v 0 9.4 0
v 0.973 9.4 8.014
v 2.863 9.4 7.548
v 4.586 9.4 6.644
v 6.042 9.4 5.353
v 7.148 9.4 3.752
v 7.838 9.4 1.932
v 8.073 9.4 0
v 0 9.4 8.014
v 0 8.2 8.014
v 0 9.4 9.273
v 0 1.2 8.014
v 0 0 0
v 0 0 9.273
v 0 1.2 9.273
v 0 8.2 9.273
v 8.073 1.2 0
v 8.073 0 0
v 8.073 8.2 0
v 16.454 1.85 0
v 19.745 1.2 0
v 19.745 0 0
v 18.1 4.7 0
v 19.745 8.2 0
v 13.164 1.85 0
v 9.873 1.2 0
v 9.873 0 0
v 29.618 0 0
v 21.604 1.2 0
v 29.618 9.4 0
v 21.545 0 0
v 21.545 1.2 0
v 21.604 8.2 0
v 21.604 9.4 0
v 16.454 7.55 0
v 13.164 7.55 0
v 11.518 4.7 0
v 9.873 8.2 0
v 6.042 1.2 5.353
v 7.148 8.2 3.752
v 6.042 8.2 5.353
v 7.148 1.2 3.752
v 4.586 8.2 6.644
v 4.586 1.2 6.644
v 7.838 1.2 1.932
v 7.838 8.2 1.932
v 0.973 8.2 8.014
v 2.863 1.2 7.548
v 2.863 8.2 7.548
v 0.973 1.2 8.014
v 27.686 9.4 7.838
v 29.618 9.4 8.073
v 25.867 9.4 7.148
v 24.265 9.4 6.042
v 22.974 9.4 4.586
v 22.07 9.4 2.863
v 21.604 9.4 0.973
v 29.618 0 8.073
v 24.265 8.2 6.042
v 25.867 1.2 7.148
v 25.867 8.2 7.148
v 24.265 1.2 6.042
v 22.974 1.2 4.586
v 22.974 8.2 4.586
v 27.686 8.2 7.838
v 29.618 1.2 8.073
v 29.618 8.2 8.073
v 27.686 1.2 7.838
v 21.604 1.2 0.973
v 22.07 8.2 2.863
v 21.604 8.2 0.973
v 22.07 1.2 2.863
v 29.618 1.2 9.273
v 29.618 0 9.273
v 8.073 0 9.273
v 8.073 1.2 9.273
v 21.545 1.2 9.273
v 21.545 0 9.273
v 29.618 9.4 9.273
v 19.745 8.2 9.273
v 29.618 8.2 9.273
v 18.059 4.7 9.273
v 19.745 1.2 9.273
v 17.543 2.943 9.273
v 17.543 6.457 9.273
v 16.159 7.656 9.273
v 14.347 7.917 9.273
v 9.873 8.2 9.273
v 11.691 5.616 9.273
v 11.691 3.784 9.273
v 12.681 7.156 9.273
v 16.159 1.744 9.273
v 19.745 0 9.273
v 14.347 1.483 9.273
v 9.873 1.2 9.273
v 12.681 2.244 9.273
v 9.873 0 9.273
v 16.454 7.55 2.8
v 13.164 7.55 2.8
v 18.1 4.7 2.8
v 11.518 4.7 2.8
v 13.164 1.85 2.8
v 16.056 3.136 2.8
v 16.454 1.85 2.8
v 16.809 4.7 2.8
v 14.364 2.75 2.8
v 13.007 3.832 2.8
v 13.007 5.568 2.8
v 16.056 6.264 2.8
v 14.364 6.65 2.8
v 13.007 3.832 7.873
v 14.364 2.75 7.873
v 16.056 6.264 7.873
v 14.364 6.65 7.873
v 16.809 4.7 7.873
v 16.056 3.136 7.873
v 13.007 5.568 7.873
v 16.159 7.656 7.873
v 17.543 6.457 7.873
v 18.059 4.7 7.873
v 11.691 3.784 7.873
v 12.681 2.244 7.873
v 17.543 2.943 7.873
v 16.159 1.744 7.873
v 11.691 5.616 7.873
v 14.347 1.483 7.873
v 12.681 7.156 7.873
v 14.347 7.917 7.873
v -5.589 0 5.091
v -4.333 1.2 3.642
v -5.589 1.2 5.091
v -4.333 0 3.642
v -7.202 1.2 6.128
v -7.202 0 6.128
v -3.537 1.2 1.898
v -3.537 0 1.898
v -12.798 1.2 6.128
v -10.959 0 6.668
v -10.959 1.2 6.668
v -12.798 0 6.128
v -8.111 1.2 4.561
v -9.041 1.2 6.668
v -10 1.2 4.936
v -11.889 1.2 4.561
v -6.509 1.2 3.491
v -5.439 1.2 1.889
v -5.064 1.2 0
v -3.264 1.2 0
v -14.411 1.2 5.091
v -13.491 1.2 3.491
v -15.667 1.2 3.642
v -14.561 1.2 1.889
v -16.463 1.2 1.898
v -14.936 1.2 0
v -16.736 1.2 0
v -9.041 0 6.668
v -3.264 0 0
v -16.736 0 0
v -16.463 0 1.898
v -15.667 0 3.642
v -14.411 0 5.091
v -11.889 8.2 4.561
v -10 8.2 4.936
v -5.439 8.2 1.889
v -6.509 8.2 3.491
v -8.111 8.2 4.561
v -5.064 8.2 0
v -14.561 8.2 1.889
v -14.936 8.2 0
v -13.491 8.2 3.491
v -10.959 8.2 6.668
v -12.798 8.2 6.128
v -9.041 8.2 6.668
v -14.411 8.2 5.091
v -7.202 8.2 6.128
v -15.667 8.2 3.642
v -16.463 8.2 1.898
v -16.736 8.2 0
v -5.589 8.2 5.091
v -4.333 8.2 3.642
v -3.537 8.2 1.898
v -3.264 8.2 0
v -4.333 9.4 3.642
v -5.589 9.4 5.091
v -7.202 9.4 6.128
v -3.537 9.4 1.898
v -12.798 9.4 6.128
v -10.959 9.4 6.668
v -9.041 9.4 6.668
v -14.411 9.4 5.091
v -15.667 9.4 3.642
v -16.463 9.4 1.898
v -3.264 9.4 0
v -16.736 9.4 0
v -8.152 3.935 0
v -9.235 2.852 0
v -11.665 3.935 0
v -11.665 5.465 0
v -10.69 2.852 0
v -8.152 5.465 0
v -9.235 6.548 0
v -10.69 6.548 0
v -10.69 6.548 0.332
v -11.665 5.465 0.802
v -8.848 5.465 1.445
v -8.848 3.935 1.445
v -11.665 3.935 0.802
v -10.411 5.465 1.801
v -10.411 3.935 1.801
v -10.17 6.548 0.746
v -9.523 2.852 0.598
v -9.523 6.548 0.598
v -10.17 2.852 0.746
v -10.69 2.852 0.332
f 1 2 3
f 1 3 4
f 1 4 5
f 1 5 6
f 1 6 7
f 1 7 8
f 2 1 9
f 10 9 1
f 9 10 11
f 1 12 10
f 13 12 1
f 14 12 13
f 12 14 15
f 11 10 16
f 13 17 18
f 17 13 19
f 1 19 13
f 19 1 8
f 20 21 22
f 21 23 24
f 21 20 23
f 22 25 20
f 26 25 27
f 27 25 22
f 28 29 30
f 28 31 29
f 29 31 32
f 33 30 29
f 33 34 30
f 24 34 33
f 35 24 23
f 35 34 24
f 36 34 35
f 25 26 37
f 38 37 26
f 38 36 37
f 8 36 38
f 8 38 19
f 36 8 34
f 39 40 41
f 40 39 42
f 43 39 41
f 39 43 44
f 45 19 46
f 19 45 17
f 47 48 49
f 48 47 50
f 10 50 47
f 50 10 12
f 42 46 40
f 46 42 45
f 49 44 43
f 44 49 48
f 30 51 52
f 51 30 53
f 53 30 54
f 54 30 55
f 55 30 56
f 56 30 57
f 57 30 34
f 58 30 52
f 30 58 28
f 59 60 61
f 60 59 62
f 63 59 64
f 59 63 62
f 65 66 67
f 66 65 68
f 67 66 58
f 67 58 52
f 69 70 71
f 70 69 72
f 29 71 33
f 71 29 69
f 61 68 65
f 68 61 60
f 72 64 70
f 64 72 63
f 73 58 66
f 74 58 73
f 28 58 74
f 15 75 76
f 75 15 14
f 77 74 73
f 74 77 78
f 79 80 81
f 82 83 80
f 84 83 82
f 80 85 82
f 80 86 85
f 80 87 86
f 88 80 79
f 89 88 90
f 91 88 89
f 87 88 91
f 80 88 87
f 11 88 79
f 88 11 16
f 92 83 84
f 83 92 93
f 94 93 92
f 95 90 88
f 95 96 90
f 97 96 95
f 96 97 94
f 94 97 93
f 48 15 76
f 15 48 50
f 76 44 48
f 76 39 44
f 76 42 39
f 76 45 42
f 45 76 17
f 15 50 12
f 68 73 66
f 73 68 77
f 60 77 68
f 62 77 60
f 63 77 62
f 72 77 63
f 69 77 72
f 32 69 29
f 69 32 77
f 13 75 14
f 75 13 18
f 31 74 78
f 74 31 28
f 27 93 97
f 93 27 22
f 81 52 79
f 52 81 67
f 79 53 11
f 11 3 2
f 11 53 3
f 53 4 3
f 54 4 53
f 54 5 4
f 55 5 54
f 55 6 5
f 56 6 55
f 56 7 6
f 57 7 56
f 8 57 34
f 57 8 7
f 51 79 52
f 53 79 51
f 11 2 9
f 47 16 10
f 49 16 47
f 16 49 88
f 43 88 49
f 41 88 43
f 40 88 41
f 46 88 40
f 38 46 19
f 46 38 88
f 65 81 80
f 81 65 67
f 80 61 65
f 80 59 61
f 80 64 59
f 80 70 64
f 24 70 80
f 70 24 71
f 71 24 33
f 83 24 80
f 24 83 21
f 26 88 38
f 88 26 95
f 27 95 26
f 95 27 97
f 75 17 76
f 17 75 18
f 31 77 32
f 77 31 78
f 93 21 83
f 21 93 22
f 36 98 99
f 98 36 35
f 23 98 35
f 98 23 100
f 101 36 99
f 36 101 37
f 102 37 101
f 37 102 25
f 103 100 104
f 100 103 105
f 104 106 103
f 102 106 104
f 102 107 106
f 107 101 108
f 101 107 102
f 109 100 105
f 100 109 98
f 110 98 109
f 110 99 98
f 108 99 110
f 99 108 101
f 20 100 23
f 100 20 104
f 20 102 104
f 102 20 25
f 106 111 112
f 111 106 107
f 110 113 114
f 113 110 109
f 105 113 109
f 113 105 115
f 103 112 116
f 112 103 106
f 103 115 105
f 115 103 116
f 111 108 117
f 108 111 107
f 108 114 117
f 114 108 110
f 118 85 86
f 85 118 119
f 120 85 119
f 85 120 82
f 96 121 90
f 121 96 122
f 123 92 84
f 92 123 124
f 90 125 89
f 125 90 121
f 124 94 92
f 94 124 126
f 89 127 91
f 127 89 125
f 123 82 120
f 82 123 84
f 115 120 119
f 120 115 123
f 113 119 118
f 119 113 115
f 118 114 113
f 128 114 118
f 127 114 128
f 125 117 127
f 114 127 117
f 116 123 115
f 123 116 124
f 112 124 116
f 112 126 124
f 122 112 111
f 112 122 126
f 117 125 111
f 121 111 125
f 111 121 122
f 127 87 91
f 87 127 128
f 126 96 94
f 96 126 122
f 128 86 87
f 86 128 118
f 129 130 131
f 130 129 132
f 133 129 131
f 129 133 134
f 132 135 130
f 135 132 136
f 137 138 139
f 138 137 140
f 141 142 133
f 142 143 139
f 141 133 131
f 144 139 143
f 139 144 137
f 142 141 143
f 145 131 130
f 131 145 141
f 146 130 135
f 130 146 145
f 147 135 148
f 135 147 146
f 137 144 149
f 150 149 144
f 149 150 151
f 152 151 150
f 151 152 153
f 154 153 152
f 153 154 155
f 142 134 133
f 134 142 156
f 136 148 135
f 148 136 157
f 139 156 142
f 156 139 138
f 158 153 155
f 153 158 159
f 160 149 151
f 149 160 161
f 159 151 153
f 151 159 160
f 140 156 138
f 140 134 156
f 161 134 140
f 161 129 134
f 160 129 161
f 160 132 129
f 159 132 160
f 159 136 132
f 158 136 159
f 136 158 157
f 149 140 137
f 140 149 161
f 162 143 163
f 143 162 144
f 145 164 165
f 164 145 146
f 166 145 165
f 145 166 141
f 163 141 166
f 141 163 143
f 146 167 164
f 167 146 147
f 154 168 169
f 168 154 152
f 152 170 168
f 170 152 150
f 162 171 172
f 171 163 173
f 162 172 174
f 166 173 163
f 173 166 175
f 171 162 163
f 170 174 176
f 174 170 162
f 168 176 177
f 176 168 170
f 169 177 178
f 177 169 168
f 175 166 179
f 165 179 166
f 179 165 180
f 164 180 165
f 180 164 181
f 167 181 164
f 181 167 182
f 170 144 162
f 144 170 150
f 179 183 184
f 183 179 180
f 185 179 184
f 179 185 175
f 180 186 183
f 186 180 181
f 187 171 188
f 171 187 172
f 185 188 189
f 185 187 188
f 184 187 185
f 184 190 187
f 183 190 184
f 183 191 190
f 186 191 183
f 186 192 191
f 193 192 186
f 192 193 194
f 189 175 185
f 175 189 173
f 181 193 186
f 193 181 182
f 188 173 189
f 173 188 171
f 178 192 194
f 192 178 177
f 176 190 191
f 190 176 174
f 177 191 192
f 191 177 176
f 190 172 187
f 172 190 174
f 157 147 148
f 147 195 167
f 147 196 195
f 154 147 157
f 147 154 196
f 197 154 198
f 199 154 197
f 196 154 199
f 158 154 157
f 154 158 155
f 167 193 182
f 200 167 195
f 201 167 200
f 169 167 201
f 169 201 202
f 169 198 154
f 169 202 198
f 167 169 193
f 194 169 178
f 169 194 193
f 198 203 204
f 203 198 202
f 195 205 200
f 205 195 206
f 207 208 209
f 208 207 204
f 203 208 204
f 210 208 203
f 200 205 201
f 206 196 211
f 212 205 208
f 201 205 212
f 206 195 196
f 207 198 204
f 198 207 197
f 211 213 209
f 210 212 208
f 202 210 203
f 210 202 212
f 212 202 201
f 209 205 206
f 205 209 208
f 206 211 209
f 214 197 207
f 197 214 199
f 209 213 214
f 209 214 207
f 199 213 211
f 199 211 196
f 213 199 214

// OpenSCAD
//Wrench size of the nut
NutWrenchSize=5.7;

//Nut Height
NutHeight=2.8;

//Diameter of bolt 
Diameter=4;

//Nut to wall ratio
NutFixingRatio=1.5;

//Bolt Head diameter
BoltHeadD=6.5;

//Bolt Head Height
BoltHeadH=2;

//Belt Width
BeltWidth=7;

//Belt Height
BeltHeight=1.8;

//Wall thickness
Wall=1.2;

//Open option
IsOpen=true;

module pole(r,h){
    intersection(){
        cube([r,r,h]);
        cylinder(r=r,h=h);
    }
}

module frame(l,w, wall=2,space=2){
    r= l/3-space;
    h=r+wall;
    union() {
        cube([l,wall,h]);
        translate([0,w-wall,0]) cube([l,wall,h]);
        translate([0,w,0]) rotate([90,0,0]) pole(r,w);
        translate([l,w,0]) rotate([90,-90,0]) pole(r,w);
        translate([l/3,0,0]) cube([l/3,w,h]);
    }
}

module part1(nws,nh,nsr,w1d,w2d,w2h,bw,bh){
    wall=Wall;
    nd=nws*2*sqrt(3)/3;
    echo(nd);
    w=bw+wall*2;
    difference(){
        frame((nd*nsr)*3,w, wall, bh);
        translate([(nd*nsr)*1.5,w/2,0]) cylinder(d=nd,h=nh,$fn=6);
        translate([(nd*nsr)*1.5,w/2,0]) cylinder(d=w1d,h=(nd*nsr));
        translate([(nd*nsr)*1.5,w/2,(nd*nsr)-w2h]) cylinder(d=w2d,h=w2h);
        if(IsOpen){
            translate([(nd*nsr)-bh,0,0]) cube([bh,Wall,(nd*nsr)]);
            translate([(nd*nsr)*2,0,0]) cube([bh,Wall,(nd*nsr)]);
        }
    }
}

module part2(nws,nsr,w1d,bw,bh){
    nd=nws*2*sqrt(3)/3;
    l=nd*nsr;
    difference(){
        union(){
            translate([0,0,-Wall]) cylinder(d=l+bh*2,h=Wall);
            cylinder(d=l,h=bw);
            translate([0,0,bw]) cylinder(d=l+bh*2,h=Wall);
        }
        translate([-(l+bh*2)/2,0,-Wall]) cube([l+bh*2,(l+bh*2)/2,bw+2*Wall]);
        translate([0,0,bw/2]) sphere(d=w1d);
    }
}

part1(NutWrenchSize,NutHeight,NutFixingRatio,Diameter,BoltHeadD,BoltHeadH,BeltWidth,BeltHeight);
translate([-BeltWidth-3,Wall,0]) rotate([-90,0,0])
part2(NutWrenchSize,NutFixingRatio,Diameter,BeltWidth,BeltHeight);
